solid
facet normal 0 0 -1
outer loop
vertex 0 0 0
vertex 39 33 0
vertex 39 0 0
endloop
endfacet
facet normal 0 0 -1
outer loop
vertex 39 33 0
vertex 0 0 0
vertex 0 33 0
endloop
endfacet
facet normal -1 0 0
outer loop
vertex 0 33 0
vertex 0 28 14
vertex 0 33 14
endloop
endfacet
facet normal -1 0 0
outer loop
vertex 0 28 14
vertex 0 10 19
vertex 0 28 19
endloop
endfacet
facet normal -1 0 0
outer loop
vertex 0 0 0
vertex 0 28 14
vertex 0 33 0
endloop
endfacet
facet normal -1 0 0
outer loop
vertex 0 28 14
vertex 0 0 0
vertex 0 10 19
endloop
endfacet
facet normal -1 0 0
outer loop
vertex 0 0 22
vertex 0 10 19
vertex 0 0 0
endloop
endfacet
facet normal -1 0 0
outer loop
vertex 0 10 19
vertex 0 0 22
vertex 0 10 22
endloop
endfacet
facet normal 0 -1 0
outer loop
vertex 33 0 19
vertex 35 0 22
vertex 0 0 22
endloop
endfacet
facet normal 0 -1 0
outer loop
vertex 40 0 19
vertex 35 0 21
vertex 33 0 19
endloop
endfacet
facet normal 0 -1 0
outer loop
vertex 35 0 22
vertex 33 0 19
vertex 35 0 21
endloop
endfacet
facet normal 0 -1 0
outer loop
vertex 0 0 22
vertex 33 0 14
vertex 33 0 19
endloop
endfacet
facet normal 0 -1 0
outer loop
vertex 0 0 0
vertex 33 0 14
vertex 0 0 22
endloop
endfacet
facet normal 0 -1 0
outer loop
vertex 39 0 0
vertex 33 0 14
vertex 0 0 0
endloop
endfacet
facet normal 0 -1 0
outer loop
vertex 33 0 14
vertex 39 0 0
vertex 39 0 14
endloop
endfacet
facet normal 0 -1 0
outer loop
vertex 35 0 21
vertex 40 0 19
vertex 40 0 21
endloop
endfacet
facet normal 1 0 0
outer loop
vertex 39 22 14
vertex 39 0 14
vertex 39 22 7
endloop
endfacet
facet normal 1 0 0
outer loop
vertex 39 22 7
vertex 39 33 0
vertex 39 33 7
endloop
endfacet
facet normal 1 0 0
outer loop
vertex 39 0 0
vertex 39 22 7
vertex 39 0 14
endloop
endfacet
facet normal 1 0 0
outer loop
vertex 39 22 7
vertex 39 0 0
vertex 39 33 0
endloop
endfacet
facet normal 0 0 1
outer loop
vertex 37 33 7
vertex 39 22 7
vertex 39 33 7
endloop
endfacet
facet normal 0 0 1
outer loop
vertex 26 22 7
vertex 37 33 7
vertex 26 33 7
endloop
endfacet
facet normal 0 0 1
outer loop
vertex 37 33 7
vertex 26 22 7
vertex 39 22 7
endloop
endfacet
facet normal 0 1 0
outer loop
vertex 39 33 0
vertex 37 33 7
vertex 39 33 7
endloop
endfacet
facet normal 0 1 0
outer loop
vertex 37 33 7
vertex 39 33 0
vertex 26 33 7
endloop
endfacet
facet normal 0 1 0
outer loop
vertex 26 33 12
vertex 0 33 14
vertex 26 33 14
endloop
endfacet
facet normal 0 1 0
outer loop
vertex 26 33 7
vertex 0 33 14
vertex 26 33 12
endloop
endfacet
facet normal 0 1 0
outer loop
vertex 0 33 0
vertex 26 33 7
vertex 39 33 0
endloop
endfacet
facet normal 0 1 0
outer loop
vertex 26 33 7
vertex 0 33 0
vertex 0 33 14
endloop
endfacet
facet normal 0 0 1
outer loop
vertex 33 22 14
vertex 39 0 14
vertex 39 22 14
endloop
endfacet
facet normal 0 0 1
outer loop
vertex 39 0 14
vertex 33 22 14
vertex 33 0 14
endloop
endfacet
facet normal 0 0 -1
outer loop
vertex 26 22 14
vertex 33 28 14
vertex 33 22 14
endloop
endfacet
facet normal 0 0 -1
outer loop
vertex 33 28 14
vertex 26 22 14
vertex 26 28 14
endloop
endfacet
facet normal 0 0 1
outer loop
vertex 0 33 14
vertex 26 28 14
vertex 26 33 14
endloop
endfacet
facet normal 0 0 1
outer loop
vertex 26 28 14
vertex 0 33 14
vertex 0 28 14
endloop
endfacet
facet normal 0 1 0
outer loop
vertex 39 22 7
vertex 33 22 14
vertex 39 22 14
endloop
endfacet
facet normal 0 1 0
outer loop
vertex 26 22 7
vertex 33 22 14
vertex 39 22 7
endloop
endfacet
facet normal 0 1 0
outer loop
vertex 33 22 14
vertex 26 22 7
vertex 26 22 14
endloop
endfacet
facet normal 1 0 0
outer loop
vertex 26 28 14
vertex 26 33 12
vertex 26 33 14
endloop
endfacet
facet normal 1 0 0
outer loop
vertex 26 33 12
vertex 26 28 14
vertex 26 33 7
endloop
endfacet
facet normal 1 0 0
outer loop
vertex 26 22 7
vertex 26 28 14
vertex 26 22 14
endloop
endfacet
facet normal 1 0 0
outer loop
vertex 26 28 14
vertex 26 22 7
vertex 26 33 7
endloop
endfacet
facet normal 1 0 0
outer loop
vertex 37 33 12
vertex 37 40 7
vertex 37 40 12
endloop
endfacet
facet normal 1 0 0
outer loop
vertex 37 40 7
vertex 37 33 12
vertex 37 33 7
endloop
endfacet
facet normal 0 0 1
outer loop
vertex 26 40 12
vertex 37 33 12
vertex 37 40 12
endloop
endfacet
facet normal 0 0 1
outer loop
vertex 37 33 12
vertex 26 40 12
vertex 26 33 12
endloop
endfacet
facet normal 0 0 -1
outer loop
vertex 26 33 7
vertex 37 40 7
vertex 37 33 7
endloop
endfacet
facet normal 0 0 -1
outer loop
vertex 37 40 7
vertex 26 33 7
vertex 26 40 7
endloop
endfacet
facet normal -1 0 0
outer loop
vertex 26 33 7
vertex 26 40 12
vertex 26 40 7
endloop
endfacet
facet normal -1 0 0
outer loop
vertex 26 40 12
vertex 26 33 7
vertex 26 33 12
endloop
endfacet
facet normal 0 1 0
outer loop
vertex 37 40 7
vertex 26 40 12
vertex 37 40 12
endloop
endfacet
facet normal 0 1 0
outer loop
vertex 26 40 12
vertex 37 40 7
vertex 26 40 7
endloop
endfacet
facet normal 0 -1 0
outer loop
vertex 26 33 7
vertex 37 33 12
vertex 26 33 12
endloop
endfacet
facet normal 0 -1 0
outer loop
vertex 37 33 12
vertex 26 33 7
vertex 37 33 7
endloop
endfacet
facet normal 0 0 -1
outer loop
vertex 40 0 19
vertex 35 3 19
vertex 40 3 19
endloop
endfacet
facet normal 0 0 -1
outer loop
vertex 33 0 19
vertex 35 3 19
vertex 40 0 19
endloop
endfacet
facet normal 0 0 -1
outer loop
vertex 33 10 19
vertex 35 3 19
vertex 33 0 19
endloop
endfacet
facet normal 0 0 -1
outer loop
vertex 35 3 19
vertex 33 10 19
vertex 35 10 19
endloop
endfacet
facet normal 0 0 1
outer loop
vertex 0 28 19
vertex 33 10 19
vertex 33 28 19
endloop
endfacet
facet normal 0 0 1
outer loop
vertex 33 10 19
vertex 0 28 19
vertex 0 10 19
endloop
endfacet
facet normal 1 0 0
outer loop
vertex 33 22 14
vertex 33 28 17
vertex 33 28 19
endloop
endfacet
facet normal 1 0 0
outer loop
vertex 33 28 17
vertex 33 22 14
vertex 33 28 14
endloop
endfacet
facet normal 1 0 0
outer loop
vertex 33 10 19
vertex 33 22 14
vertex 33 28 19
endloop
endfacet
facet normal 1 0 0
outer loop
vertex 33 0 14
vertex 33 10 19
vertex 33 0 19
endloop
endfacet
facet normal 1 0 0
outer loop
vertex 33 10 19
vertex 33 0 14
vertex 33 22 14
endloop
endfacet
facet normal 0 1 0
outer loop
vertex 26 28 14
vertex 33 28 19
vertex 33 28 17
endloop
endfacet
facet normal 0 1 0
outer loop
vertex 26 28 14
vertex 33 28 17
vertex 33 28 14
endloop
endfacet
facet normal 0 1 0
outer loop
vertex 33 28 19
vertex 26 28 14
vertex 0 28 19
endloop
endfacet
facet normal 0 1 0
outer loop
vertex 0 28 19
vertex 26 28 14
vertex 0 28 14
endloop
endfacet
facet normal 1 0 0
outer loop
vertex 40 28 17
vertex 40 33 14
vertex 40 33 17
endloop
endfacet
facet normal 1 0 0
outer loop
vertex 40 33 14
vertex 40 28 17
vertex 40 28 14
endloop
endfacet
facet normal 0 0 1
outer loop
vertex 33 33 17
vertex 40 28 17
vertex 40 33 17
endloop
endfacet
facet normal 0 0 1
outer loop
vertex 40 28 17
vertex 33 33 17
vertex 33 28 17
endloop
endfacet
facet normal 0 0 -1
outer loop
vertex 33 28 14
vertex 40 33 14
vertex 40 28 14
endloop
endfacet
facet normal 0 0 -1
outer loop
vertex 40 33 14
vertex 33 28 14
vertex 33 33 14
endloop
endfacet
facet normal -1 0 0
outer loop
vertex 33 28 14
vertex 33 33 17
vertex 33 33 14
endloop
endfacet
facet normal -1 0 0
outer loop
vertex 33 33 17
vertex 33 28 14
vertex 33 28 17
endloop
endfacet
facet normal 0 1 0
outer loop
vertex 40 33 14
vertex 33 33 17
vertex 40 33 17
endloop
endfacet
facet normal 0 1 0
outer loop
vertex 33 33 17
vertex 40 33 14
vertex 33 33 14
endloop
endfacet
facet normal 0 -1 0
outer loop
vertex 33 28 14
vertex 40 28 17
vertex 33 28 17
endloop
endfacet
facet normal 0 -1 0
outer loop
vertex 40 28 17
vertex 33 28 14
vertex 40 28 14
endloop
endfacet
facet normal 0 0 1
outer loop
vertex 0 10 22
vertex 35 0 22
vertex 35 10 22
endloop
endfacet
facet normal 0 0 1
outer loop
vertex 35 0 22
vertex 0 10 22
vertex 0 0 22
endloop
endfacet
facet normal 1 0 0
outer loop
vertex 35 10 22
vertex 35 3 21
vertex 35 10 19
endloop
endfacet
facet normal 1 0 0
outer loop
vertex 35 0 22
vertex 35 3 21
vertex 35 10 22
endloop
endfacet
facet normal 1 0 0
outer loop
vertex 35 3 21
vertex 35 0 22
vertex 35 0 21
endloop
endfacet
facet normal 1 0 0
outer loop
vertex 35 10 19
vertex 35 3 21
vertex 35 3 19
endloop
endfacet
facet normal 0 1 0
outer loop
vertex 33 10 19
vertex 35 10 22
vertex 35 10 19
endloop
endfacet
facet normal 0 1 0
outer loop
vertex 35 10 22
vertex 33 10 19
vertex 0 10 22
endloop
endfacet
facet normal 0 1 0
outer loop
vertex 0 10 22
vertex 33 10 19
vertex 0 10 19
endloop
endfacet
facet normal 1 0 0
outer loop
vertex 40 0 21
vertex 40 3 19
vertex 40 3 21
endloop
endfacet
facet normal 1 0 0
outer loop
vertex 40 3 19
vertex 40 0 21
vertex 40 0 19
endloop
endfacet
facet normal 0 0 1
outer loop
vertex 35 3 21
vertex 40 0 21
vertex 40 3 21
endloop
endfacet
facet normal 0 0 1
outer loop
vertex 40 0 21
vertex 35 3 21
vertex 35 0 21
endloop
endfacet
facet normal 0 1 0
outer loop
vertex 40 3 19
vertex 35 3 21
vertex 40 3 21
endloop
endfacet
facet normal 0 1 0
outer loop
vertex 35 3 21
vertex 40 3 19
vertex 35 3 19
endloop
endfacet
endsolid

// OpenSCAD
translate([6.5, 5.5, 3.5]) color([0.14750072005511716, 0.31607169754224296, 0.2088660889148145]) cube([13, 11, 7], center=true);
translate([19.5, 5.5, 3.5]) color([0.1868244368145192, 0.3491672112743387, 0.9834841816788549]) cube([13, 11, 7], center=true);
translate([32.5, 5.5, 3.5]) color([0.427290207198605, 0.49195852420878716, 0.7297831417632067]) cube([13, 11, 7], center=true);
translate([6.5, 16.5, 3.5]) color([0.7955834433152874, 0.43927203819181504, 0.2042687131951023]) cube([13, 11, 7], center=true);
translate([19.5, 16.5, 3.5]) color([0.709997013582239, 0.9058221085991531, 0.03327924187503195]) cube([13, 11, 7], center=true);
translate([32.5, 16.5, 3.5]) color([0.6331757983912308, 0.8710093735661795, 0.3636101637556439]) cube([13, 11, 7], center=true);
translate([6.5, 27.5, 3.5]) color([0.7431628081058981, 0.6774926049513658, 0.23306417175218364]) cube([13, 11, 7], center=true);
translate([19.5, 27.5, 3.5]) color([0.2975271762349214, 0.0866296567389645, 0.8688435220131177]) cube([13, 11, 7], center=true);
translate([32.5, 27.5, 3.5]) color([0.7514921149941085, 0.7714305883456576, 0.8829516943772963]) cube([13, 11, 7], center=true);
translate([6.5, 5.5, 10.5]) color([0.4114323292545551, 0.05394001775890156, 0.696805048854085]) cube([13, 11, 7], center=true);
translate([19.5, 5.5, 10.5]) color([0.6656296547984208, 0.6485122289860075, 0.5471816206705559]) cube([13, 11, 7], center=true);
translate([32.5, 5.5, 10.5]) color([0.7344166333532061, 0.4306045068871984, 0.45460236437769275]) cube([13, 11, 7], center=true);
translate([6.5, 16.5, 10.5]) color([0.25475221651879554, 0.47565246533915095, 0.3371942584654095]) cube([13, 11, 7], center=true);
translate([19.5, 16.5, 10.5]) color([0.04223511400675217, 0.05255331220371673, 0.34980223330761895]) cube([13, 11, 7], center=true);
translate([32.5, 16.5, 10.5]) color([0.2898096938030986, 0.007130057665757694, 0.06369015415518986]) cube([13, 11, 7], center=true);
translate([6.5, 27.5, 10.5]) color([0.42774457246440645, 0.22216650821772055, 0.6086379170158094]) cube([13, 11, 7], center=true);
translate([19.5, 27.5, 10.5]) color([0.557768500755667, 0.22097295115667703, 0.19284823789822858]) cube([13, 11, 7], center=true);
translate([31.5, 36.5, 9.5]) color([0.6083188139076446, 0.606354511401297, 0.08562053587131313]) cube([11, 7, 5], center=true);
translate([5.5, 3.5, 16.5]) color([0.31903016062772993, 0.53590115499306, 0.8934753784920533]) cube([11, 7, 5], center=true);
translate([16.5, 3.5, 16.5]) color([0.25549985489866966, 0.5219903070058861, 0.1901317713313112]) cube([11, 7, 5], center=true);
translate([27.5, 3.5, 16.5]) color([0.08011594570868696, 0.8699478397109702, 0.3457472114844995]) cube([11, 7, 5], center=true);
translate([5.5, 10.5, 16.5]) color([0.837290862214726, 0.25127706432840136, 0.7290260027021367]) cube([11, 7, 5], center=true);
translate([16.5, 10.5, 16.5]) color([0.3013213449137814, 0.5169005458056509, 0.38467176448284957]) cube([11, 7, 5], center=true);
translate([27.5, 10.5, 16.5]) color([0.4820846642847386, 0.8719757028853922, 0.2399620044566907]) cube([11, 7, 5], center=true);
translate([5.5, 17.5, 16.5]) color([0.3058147052987177, 0.5519737755681405, 0.009208459116004764]) cube([11, 7, 5], center=true);
translate([16.5, 17.5, 16.5]) color([0.4953005367860557, 0.43819859659275806, 0.9171481192782721]) cube([11, 7, 5], center=true);
translate([27.5, 17.5, 16.5]) color([0.41212019308576986, 0.49358197644734136, 0.44010860560926524]) cube([11, 7, 5], center=true);
translate([5.5, 24.5, 16.5]) color([0.0856157398333921, 0.2411443971002879, 0.8262650576639278]) cube([11, 7, 5], center=true);
translate([16.5, 24.5, 16.5]) color([0.15379567752788093, 0.8842528530898255, 0.2134665283608419]) cube([11, 7, 5], center=true);
translate([27.5, 24.5, 16.5]) color([0.6127566924478359, 0.818008657000479, 0.5590112191053322]) cube([11, 7, 5], center=true);
translate([36.5, 30.5, 15.5]) color([0.8866043301622452, 0.39447102725022787, 0.9589163376419946]) cube([7, 5, 3], center=true);
translate([3.5, 2.5, 20.5]) color([0.24972819156954773, 0.22005049979750413, 0.8404590105346786]) cube([7, 5, 3], center=true);
translate([10.5, 2.5, 20.5]) color([0.2789960200671917, 0.35210354864297055, 0.9946691500756418]) cube([7, 5, 3], center=true);
translate([17.5, 2.5, 20.5]) color([0.10728537706325991, 0.8996256313138141, 0.6100819970747507]) cube([7, 5, 3], center=true);
translate([24.5, 2.5, 20.5]) color([0.7890377134172993, 0.7110679469752405, 0.7774643558396669]) cube([7, 5, 3], center=true);
translate([31.5, 2.5, 20.5]) color([0.5140354678382717, 0.46207744282607, 0.6343562920465169]) cube([7, 5, 3], center=true);
translate([3.5, 7.5, 20.5]) color([0.27254621857246664, 0.016558424522952975, 0.6148716567717017]) cube([7, 5, 3], center=true);
translate([10.5, 7.5, 20.5]) color([0.7119066573597548, 0.17257617960039529, 0.41465974039415787]) cube([7, 5, 3], center=true);
translate([17.5, 7.5, 20.5]) color([0.21806470516739018, 0.8797884787327306, 0.9971497033508181]) cube([7, 5, 3], center=true);
translate([24.5, 7.5, 20.5]) color([0.006439244314443648, 0.5355241113549698, 0.428269623660265]) cube([7, 5, 3], center=true);
translate([31.5, 7.5, 20.5]) color([0.0497703561320445, 0.3846945959716809, 0.27248481749180187]) cube([7, 5, 3], center=true);
translate([37.5, 1.5, 20.0]) color([0.9711494351721061, 0.5646669518865992, 0.22956269737245216]) cube([5, 3, 2], center=true);
translate([2.5, 6.5, 20.0]) color([0.7165492601952248, 0.5466375027642284, 0.2821670936164109]) cube([5, 3, 2], center=true);
translate([7.5, 6.5, 20.0]) color([0.7398695784196249, 0.9015687423954613, 0.06478718309218656]) cube([5, 3, 2], center=true);
translate([12.5, 6.5, 20.0]) color([0.3075184499818515, 0.32730937178137276, 0.373196919474838]) cube([5, 3, 2], center=true);
translate([17.5, 6.5, 20.0]) color([0.48026967262350795, 0.5820603979481933, 0.1372879505883815]) cube([5, 3, 2], center=true);
translate([22.5, 6.5, 20.0]) color([0.015498761483451418, 0.5048497045627587, 0.36698725510709684]) cube([5, 3, 2], center=true);
translate([27.5, 6.5, 20.0]) color([0.6348155217266559, 0.811995686067811, 0.8768405645756486]) cube([5, 3, 2], center=true);
